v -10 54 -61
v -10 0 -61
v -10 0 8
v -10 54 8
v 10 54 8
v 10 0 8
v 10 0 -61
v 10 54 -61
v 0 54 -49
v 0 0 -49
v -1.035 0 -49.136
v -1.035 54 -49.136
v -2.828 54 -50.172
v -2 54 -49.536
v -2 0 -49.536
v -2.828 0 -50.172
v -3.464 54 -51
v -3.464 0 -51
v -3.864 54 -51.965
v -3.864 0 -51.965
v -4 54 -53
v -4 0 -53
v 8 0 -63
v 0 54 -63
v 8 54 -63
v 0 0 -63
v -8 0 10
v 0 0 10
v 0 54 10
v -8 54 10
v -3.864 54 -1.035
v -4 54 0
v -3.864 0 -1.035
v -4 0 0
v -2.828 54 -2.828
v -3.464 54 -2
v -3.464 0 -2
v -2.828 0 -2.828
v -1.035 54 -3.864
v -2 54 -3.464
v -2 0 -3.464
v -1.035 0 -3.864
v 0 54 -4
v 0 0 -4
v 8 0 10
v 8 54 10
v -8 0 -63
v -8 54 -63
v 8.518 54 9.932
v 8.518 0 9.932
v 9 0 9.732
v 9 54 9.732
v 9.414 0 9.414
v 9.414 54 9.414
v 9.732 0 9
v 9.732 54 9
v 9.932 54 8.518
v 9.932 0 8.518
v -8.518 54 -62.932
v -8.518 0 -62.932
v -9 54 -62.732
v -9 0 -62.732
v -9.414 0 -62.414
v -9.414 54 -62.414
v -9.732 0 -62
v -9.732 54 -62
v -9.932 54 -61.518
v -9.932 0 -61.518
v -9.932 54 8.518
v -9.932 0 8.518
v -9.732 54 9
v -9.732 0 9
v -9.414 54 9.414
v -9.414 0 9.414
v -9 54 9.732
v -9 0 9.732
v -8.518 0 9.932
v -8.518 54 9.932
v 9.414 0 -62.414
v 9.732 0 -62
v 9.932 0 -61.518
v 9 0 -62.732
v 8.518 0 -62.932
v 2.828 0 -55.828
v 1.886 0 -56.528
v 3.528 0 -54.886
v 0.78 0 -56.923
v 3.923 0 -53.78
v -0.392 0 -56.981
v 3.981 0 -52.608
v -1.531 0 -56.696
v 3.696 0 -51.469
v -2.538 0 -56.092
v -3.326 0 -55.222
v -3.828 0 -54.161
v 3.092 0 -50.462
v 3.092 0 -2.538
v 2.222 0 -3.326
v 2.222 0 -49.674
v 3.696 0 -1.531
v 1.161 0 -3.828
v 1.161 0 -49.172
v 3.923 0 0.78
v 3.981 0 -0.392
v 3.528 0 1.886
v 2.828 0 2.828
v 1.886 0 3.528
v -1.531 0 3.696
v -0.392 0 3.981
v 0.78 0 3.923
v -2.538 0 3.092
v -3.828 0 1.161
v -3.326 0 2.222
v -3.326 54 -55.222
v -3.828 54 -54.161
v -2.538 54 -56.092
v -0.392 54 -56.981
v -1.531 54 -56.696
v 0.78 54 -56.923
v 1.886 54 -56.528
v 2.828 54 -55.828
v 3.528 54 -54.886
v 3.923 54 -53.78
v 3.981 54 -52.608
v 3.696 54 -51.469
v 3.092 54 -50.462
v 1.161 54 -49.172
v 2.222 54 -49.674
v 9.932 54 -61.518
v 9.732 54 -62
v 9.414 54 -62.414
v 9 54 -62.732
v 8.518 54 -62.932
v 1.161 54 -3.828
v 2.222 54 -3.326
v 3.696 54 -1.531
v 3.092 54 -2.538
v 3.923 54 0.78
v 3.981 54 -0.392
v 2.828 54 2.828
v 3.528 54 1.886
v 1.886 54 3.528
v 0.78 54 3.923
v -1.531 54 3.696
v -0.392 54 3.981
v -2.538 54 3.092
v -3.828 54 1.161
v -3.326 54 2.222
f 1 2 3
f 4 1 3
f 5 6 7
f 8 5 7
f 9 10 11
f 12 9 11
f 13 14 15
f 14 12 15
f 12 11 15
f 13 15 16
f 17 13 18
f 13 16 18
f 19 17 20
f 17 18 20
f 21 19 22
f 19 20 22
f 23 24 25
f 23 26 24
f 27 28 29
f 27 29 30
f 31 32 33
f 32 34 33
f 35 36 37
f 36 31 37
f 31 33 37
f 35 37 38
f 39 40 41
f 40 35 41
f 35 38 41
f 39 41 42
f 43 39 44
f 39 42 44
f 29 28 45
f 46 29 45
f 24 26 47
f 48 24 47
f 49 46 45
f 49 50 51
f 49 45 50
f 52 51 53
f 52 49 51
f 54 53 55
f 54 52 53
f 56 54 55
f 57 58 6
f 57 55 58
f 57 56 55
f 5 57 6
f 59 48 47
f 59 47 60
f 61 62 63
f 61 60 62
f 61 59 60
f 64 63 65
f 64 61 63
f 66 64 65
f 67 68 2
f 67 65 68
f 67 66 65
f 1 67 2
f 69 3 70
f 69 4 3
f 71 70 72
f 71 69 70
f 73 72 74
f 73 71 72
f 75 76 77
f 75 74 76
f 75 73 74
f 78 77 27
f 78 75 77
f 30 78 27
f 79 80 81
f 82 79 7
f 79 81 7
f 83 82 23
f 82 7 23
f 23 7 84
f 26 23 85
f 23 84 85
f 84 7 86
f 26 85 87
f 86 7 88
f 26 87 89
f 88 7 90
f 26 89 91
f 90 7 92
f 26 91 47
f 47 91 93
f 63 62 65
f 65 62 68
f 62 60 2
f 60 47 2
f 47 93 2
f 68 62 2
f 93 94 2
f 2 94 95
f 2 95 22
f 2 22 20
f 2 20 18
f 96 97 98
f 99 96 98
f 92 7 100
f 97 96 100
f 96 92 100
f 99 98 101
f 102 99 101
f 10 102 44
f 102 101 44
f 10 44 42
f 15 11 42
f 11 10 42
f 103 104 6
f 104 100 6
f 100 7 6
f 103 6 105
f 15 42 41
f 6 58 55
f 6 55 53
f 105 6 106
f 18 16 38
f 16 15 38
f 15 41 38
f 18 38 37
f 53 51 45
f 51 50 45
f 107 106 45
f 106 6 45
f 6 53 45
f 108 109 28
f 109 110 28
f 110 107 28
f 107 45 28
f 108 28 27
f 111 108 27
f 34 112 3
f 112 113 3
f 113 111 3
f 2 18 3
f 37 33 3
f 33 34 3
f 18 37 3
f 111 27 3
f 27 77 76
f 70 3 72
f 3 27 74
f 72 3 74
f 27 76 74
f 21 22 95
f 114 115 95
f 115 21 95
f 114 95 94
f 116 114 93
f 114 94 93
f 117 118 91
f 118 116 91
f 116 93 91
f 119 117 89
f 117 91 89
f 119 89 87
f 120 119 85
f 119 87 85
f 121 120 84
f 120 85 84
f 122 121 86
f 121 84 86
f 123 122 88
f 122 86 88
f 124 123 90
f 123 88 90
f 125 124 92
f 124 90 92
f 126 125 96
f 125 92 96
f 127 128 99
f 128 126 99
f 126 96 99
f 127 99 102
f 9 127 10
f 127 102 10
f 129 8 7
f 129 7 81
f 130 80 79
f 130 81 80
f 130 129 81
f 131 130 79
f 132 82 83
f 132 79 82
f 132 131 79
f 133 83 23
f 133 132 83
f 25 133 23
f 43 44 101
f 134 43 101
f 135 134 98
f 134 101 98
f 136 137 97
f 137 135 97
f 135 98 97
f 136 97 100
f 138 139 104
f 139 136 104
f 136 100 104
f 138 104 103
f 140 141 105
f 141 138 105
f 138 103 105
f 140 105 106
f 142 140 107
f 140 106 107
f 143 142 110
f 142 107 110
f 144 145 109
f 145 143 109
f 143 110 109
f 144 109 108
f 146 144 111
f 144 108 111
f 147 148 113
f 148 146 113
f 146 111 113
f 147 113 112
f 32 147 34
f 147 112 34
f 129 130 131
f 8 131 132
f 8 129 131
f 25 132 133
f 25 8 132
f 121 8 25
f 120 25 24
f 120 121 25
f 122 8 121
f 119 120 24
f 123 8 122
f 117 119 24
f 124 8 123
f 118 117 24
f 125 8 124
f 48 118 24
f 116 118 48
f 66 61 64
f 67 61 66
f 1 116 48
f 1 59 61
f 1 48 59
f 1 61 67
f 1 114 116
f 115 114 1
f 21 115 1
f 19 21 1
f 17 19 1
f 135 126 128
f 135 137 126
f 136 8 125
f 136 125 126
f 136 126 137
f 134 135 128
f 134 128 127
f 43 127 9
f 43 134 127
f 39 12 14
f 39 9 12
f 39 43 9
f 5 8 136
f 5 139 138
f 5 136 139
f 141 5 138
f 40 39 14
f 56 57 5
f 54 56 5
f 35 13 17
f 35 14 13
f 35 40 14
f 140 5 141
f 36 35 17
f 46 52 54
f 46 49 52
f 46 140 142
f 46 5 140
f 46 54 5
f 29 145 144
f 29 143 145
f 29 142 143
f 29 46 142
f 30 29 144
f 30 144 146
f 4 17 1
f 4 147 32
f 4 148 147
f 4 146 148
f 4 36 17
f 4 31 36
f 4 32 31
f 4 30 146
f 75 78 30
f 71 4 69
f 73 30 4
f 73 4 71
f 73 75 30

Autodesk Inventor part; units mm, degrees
ref_plane "YZ Plane" through (0, 0, 0) normal (1, 0, 0) x (0, 1, 0)
ref_plane "XZ Plane" through (0, 0, 0) normal (0, 1, 0) x (-1, 0, 0)
ref_plane "XY Plane" through (0, 0, 0) normal (0, 0, 1) x (1, 0, 0)
sketch "Sketch1" plane through (0, 0, 0) normal (0, 1, 0) x (-1, 0, 0)
  line L0 (0, 0) -> (0, -53)
  circle A0 centre (0, 0) radius 4
  circle A1 centre (0, -53) radius 4
  line L1 (0, 10) -> (10, 10)
  line L2 (0, -63) -> (-10, -63)
  line L3 (10, 10) -> (-10, 10)
  line L4 (-10, 10) -> (-10, -63)
  line L5 (-10, -63) -> (10, -63)
  line L6 (10, -63) -> (10, 10)
  dimension "d0" = 53
  dimension "d1" = 8
  dimension "d2" = 8
  dimension "d3" = 10
  dimension "d4" = 10
  dimension "d5" = 10
  dimension "d6" = 10
  dimension "d8" = 10
  dimension "d9" = 10
  dimension "d10" = 73
extrude "Extrusion1" add sketch "Sketch1" along normal blind 54
fillet "Fillet1" radius 2 4 edges at (10, 27, 10) (-10, 27, 10) (10, 27, -63) (-10, 27, -63)
properties part number "Bearing Seats"
